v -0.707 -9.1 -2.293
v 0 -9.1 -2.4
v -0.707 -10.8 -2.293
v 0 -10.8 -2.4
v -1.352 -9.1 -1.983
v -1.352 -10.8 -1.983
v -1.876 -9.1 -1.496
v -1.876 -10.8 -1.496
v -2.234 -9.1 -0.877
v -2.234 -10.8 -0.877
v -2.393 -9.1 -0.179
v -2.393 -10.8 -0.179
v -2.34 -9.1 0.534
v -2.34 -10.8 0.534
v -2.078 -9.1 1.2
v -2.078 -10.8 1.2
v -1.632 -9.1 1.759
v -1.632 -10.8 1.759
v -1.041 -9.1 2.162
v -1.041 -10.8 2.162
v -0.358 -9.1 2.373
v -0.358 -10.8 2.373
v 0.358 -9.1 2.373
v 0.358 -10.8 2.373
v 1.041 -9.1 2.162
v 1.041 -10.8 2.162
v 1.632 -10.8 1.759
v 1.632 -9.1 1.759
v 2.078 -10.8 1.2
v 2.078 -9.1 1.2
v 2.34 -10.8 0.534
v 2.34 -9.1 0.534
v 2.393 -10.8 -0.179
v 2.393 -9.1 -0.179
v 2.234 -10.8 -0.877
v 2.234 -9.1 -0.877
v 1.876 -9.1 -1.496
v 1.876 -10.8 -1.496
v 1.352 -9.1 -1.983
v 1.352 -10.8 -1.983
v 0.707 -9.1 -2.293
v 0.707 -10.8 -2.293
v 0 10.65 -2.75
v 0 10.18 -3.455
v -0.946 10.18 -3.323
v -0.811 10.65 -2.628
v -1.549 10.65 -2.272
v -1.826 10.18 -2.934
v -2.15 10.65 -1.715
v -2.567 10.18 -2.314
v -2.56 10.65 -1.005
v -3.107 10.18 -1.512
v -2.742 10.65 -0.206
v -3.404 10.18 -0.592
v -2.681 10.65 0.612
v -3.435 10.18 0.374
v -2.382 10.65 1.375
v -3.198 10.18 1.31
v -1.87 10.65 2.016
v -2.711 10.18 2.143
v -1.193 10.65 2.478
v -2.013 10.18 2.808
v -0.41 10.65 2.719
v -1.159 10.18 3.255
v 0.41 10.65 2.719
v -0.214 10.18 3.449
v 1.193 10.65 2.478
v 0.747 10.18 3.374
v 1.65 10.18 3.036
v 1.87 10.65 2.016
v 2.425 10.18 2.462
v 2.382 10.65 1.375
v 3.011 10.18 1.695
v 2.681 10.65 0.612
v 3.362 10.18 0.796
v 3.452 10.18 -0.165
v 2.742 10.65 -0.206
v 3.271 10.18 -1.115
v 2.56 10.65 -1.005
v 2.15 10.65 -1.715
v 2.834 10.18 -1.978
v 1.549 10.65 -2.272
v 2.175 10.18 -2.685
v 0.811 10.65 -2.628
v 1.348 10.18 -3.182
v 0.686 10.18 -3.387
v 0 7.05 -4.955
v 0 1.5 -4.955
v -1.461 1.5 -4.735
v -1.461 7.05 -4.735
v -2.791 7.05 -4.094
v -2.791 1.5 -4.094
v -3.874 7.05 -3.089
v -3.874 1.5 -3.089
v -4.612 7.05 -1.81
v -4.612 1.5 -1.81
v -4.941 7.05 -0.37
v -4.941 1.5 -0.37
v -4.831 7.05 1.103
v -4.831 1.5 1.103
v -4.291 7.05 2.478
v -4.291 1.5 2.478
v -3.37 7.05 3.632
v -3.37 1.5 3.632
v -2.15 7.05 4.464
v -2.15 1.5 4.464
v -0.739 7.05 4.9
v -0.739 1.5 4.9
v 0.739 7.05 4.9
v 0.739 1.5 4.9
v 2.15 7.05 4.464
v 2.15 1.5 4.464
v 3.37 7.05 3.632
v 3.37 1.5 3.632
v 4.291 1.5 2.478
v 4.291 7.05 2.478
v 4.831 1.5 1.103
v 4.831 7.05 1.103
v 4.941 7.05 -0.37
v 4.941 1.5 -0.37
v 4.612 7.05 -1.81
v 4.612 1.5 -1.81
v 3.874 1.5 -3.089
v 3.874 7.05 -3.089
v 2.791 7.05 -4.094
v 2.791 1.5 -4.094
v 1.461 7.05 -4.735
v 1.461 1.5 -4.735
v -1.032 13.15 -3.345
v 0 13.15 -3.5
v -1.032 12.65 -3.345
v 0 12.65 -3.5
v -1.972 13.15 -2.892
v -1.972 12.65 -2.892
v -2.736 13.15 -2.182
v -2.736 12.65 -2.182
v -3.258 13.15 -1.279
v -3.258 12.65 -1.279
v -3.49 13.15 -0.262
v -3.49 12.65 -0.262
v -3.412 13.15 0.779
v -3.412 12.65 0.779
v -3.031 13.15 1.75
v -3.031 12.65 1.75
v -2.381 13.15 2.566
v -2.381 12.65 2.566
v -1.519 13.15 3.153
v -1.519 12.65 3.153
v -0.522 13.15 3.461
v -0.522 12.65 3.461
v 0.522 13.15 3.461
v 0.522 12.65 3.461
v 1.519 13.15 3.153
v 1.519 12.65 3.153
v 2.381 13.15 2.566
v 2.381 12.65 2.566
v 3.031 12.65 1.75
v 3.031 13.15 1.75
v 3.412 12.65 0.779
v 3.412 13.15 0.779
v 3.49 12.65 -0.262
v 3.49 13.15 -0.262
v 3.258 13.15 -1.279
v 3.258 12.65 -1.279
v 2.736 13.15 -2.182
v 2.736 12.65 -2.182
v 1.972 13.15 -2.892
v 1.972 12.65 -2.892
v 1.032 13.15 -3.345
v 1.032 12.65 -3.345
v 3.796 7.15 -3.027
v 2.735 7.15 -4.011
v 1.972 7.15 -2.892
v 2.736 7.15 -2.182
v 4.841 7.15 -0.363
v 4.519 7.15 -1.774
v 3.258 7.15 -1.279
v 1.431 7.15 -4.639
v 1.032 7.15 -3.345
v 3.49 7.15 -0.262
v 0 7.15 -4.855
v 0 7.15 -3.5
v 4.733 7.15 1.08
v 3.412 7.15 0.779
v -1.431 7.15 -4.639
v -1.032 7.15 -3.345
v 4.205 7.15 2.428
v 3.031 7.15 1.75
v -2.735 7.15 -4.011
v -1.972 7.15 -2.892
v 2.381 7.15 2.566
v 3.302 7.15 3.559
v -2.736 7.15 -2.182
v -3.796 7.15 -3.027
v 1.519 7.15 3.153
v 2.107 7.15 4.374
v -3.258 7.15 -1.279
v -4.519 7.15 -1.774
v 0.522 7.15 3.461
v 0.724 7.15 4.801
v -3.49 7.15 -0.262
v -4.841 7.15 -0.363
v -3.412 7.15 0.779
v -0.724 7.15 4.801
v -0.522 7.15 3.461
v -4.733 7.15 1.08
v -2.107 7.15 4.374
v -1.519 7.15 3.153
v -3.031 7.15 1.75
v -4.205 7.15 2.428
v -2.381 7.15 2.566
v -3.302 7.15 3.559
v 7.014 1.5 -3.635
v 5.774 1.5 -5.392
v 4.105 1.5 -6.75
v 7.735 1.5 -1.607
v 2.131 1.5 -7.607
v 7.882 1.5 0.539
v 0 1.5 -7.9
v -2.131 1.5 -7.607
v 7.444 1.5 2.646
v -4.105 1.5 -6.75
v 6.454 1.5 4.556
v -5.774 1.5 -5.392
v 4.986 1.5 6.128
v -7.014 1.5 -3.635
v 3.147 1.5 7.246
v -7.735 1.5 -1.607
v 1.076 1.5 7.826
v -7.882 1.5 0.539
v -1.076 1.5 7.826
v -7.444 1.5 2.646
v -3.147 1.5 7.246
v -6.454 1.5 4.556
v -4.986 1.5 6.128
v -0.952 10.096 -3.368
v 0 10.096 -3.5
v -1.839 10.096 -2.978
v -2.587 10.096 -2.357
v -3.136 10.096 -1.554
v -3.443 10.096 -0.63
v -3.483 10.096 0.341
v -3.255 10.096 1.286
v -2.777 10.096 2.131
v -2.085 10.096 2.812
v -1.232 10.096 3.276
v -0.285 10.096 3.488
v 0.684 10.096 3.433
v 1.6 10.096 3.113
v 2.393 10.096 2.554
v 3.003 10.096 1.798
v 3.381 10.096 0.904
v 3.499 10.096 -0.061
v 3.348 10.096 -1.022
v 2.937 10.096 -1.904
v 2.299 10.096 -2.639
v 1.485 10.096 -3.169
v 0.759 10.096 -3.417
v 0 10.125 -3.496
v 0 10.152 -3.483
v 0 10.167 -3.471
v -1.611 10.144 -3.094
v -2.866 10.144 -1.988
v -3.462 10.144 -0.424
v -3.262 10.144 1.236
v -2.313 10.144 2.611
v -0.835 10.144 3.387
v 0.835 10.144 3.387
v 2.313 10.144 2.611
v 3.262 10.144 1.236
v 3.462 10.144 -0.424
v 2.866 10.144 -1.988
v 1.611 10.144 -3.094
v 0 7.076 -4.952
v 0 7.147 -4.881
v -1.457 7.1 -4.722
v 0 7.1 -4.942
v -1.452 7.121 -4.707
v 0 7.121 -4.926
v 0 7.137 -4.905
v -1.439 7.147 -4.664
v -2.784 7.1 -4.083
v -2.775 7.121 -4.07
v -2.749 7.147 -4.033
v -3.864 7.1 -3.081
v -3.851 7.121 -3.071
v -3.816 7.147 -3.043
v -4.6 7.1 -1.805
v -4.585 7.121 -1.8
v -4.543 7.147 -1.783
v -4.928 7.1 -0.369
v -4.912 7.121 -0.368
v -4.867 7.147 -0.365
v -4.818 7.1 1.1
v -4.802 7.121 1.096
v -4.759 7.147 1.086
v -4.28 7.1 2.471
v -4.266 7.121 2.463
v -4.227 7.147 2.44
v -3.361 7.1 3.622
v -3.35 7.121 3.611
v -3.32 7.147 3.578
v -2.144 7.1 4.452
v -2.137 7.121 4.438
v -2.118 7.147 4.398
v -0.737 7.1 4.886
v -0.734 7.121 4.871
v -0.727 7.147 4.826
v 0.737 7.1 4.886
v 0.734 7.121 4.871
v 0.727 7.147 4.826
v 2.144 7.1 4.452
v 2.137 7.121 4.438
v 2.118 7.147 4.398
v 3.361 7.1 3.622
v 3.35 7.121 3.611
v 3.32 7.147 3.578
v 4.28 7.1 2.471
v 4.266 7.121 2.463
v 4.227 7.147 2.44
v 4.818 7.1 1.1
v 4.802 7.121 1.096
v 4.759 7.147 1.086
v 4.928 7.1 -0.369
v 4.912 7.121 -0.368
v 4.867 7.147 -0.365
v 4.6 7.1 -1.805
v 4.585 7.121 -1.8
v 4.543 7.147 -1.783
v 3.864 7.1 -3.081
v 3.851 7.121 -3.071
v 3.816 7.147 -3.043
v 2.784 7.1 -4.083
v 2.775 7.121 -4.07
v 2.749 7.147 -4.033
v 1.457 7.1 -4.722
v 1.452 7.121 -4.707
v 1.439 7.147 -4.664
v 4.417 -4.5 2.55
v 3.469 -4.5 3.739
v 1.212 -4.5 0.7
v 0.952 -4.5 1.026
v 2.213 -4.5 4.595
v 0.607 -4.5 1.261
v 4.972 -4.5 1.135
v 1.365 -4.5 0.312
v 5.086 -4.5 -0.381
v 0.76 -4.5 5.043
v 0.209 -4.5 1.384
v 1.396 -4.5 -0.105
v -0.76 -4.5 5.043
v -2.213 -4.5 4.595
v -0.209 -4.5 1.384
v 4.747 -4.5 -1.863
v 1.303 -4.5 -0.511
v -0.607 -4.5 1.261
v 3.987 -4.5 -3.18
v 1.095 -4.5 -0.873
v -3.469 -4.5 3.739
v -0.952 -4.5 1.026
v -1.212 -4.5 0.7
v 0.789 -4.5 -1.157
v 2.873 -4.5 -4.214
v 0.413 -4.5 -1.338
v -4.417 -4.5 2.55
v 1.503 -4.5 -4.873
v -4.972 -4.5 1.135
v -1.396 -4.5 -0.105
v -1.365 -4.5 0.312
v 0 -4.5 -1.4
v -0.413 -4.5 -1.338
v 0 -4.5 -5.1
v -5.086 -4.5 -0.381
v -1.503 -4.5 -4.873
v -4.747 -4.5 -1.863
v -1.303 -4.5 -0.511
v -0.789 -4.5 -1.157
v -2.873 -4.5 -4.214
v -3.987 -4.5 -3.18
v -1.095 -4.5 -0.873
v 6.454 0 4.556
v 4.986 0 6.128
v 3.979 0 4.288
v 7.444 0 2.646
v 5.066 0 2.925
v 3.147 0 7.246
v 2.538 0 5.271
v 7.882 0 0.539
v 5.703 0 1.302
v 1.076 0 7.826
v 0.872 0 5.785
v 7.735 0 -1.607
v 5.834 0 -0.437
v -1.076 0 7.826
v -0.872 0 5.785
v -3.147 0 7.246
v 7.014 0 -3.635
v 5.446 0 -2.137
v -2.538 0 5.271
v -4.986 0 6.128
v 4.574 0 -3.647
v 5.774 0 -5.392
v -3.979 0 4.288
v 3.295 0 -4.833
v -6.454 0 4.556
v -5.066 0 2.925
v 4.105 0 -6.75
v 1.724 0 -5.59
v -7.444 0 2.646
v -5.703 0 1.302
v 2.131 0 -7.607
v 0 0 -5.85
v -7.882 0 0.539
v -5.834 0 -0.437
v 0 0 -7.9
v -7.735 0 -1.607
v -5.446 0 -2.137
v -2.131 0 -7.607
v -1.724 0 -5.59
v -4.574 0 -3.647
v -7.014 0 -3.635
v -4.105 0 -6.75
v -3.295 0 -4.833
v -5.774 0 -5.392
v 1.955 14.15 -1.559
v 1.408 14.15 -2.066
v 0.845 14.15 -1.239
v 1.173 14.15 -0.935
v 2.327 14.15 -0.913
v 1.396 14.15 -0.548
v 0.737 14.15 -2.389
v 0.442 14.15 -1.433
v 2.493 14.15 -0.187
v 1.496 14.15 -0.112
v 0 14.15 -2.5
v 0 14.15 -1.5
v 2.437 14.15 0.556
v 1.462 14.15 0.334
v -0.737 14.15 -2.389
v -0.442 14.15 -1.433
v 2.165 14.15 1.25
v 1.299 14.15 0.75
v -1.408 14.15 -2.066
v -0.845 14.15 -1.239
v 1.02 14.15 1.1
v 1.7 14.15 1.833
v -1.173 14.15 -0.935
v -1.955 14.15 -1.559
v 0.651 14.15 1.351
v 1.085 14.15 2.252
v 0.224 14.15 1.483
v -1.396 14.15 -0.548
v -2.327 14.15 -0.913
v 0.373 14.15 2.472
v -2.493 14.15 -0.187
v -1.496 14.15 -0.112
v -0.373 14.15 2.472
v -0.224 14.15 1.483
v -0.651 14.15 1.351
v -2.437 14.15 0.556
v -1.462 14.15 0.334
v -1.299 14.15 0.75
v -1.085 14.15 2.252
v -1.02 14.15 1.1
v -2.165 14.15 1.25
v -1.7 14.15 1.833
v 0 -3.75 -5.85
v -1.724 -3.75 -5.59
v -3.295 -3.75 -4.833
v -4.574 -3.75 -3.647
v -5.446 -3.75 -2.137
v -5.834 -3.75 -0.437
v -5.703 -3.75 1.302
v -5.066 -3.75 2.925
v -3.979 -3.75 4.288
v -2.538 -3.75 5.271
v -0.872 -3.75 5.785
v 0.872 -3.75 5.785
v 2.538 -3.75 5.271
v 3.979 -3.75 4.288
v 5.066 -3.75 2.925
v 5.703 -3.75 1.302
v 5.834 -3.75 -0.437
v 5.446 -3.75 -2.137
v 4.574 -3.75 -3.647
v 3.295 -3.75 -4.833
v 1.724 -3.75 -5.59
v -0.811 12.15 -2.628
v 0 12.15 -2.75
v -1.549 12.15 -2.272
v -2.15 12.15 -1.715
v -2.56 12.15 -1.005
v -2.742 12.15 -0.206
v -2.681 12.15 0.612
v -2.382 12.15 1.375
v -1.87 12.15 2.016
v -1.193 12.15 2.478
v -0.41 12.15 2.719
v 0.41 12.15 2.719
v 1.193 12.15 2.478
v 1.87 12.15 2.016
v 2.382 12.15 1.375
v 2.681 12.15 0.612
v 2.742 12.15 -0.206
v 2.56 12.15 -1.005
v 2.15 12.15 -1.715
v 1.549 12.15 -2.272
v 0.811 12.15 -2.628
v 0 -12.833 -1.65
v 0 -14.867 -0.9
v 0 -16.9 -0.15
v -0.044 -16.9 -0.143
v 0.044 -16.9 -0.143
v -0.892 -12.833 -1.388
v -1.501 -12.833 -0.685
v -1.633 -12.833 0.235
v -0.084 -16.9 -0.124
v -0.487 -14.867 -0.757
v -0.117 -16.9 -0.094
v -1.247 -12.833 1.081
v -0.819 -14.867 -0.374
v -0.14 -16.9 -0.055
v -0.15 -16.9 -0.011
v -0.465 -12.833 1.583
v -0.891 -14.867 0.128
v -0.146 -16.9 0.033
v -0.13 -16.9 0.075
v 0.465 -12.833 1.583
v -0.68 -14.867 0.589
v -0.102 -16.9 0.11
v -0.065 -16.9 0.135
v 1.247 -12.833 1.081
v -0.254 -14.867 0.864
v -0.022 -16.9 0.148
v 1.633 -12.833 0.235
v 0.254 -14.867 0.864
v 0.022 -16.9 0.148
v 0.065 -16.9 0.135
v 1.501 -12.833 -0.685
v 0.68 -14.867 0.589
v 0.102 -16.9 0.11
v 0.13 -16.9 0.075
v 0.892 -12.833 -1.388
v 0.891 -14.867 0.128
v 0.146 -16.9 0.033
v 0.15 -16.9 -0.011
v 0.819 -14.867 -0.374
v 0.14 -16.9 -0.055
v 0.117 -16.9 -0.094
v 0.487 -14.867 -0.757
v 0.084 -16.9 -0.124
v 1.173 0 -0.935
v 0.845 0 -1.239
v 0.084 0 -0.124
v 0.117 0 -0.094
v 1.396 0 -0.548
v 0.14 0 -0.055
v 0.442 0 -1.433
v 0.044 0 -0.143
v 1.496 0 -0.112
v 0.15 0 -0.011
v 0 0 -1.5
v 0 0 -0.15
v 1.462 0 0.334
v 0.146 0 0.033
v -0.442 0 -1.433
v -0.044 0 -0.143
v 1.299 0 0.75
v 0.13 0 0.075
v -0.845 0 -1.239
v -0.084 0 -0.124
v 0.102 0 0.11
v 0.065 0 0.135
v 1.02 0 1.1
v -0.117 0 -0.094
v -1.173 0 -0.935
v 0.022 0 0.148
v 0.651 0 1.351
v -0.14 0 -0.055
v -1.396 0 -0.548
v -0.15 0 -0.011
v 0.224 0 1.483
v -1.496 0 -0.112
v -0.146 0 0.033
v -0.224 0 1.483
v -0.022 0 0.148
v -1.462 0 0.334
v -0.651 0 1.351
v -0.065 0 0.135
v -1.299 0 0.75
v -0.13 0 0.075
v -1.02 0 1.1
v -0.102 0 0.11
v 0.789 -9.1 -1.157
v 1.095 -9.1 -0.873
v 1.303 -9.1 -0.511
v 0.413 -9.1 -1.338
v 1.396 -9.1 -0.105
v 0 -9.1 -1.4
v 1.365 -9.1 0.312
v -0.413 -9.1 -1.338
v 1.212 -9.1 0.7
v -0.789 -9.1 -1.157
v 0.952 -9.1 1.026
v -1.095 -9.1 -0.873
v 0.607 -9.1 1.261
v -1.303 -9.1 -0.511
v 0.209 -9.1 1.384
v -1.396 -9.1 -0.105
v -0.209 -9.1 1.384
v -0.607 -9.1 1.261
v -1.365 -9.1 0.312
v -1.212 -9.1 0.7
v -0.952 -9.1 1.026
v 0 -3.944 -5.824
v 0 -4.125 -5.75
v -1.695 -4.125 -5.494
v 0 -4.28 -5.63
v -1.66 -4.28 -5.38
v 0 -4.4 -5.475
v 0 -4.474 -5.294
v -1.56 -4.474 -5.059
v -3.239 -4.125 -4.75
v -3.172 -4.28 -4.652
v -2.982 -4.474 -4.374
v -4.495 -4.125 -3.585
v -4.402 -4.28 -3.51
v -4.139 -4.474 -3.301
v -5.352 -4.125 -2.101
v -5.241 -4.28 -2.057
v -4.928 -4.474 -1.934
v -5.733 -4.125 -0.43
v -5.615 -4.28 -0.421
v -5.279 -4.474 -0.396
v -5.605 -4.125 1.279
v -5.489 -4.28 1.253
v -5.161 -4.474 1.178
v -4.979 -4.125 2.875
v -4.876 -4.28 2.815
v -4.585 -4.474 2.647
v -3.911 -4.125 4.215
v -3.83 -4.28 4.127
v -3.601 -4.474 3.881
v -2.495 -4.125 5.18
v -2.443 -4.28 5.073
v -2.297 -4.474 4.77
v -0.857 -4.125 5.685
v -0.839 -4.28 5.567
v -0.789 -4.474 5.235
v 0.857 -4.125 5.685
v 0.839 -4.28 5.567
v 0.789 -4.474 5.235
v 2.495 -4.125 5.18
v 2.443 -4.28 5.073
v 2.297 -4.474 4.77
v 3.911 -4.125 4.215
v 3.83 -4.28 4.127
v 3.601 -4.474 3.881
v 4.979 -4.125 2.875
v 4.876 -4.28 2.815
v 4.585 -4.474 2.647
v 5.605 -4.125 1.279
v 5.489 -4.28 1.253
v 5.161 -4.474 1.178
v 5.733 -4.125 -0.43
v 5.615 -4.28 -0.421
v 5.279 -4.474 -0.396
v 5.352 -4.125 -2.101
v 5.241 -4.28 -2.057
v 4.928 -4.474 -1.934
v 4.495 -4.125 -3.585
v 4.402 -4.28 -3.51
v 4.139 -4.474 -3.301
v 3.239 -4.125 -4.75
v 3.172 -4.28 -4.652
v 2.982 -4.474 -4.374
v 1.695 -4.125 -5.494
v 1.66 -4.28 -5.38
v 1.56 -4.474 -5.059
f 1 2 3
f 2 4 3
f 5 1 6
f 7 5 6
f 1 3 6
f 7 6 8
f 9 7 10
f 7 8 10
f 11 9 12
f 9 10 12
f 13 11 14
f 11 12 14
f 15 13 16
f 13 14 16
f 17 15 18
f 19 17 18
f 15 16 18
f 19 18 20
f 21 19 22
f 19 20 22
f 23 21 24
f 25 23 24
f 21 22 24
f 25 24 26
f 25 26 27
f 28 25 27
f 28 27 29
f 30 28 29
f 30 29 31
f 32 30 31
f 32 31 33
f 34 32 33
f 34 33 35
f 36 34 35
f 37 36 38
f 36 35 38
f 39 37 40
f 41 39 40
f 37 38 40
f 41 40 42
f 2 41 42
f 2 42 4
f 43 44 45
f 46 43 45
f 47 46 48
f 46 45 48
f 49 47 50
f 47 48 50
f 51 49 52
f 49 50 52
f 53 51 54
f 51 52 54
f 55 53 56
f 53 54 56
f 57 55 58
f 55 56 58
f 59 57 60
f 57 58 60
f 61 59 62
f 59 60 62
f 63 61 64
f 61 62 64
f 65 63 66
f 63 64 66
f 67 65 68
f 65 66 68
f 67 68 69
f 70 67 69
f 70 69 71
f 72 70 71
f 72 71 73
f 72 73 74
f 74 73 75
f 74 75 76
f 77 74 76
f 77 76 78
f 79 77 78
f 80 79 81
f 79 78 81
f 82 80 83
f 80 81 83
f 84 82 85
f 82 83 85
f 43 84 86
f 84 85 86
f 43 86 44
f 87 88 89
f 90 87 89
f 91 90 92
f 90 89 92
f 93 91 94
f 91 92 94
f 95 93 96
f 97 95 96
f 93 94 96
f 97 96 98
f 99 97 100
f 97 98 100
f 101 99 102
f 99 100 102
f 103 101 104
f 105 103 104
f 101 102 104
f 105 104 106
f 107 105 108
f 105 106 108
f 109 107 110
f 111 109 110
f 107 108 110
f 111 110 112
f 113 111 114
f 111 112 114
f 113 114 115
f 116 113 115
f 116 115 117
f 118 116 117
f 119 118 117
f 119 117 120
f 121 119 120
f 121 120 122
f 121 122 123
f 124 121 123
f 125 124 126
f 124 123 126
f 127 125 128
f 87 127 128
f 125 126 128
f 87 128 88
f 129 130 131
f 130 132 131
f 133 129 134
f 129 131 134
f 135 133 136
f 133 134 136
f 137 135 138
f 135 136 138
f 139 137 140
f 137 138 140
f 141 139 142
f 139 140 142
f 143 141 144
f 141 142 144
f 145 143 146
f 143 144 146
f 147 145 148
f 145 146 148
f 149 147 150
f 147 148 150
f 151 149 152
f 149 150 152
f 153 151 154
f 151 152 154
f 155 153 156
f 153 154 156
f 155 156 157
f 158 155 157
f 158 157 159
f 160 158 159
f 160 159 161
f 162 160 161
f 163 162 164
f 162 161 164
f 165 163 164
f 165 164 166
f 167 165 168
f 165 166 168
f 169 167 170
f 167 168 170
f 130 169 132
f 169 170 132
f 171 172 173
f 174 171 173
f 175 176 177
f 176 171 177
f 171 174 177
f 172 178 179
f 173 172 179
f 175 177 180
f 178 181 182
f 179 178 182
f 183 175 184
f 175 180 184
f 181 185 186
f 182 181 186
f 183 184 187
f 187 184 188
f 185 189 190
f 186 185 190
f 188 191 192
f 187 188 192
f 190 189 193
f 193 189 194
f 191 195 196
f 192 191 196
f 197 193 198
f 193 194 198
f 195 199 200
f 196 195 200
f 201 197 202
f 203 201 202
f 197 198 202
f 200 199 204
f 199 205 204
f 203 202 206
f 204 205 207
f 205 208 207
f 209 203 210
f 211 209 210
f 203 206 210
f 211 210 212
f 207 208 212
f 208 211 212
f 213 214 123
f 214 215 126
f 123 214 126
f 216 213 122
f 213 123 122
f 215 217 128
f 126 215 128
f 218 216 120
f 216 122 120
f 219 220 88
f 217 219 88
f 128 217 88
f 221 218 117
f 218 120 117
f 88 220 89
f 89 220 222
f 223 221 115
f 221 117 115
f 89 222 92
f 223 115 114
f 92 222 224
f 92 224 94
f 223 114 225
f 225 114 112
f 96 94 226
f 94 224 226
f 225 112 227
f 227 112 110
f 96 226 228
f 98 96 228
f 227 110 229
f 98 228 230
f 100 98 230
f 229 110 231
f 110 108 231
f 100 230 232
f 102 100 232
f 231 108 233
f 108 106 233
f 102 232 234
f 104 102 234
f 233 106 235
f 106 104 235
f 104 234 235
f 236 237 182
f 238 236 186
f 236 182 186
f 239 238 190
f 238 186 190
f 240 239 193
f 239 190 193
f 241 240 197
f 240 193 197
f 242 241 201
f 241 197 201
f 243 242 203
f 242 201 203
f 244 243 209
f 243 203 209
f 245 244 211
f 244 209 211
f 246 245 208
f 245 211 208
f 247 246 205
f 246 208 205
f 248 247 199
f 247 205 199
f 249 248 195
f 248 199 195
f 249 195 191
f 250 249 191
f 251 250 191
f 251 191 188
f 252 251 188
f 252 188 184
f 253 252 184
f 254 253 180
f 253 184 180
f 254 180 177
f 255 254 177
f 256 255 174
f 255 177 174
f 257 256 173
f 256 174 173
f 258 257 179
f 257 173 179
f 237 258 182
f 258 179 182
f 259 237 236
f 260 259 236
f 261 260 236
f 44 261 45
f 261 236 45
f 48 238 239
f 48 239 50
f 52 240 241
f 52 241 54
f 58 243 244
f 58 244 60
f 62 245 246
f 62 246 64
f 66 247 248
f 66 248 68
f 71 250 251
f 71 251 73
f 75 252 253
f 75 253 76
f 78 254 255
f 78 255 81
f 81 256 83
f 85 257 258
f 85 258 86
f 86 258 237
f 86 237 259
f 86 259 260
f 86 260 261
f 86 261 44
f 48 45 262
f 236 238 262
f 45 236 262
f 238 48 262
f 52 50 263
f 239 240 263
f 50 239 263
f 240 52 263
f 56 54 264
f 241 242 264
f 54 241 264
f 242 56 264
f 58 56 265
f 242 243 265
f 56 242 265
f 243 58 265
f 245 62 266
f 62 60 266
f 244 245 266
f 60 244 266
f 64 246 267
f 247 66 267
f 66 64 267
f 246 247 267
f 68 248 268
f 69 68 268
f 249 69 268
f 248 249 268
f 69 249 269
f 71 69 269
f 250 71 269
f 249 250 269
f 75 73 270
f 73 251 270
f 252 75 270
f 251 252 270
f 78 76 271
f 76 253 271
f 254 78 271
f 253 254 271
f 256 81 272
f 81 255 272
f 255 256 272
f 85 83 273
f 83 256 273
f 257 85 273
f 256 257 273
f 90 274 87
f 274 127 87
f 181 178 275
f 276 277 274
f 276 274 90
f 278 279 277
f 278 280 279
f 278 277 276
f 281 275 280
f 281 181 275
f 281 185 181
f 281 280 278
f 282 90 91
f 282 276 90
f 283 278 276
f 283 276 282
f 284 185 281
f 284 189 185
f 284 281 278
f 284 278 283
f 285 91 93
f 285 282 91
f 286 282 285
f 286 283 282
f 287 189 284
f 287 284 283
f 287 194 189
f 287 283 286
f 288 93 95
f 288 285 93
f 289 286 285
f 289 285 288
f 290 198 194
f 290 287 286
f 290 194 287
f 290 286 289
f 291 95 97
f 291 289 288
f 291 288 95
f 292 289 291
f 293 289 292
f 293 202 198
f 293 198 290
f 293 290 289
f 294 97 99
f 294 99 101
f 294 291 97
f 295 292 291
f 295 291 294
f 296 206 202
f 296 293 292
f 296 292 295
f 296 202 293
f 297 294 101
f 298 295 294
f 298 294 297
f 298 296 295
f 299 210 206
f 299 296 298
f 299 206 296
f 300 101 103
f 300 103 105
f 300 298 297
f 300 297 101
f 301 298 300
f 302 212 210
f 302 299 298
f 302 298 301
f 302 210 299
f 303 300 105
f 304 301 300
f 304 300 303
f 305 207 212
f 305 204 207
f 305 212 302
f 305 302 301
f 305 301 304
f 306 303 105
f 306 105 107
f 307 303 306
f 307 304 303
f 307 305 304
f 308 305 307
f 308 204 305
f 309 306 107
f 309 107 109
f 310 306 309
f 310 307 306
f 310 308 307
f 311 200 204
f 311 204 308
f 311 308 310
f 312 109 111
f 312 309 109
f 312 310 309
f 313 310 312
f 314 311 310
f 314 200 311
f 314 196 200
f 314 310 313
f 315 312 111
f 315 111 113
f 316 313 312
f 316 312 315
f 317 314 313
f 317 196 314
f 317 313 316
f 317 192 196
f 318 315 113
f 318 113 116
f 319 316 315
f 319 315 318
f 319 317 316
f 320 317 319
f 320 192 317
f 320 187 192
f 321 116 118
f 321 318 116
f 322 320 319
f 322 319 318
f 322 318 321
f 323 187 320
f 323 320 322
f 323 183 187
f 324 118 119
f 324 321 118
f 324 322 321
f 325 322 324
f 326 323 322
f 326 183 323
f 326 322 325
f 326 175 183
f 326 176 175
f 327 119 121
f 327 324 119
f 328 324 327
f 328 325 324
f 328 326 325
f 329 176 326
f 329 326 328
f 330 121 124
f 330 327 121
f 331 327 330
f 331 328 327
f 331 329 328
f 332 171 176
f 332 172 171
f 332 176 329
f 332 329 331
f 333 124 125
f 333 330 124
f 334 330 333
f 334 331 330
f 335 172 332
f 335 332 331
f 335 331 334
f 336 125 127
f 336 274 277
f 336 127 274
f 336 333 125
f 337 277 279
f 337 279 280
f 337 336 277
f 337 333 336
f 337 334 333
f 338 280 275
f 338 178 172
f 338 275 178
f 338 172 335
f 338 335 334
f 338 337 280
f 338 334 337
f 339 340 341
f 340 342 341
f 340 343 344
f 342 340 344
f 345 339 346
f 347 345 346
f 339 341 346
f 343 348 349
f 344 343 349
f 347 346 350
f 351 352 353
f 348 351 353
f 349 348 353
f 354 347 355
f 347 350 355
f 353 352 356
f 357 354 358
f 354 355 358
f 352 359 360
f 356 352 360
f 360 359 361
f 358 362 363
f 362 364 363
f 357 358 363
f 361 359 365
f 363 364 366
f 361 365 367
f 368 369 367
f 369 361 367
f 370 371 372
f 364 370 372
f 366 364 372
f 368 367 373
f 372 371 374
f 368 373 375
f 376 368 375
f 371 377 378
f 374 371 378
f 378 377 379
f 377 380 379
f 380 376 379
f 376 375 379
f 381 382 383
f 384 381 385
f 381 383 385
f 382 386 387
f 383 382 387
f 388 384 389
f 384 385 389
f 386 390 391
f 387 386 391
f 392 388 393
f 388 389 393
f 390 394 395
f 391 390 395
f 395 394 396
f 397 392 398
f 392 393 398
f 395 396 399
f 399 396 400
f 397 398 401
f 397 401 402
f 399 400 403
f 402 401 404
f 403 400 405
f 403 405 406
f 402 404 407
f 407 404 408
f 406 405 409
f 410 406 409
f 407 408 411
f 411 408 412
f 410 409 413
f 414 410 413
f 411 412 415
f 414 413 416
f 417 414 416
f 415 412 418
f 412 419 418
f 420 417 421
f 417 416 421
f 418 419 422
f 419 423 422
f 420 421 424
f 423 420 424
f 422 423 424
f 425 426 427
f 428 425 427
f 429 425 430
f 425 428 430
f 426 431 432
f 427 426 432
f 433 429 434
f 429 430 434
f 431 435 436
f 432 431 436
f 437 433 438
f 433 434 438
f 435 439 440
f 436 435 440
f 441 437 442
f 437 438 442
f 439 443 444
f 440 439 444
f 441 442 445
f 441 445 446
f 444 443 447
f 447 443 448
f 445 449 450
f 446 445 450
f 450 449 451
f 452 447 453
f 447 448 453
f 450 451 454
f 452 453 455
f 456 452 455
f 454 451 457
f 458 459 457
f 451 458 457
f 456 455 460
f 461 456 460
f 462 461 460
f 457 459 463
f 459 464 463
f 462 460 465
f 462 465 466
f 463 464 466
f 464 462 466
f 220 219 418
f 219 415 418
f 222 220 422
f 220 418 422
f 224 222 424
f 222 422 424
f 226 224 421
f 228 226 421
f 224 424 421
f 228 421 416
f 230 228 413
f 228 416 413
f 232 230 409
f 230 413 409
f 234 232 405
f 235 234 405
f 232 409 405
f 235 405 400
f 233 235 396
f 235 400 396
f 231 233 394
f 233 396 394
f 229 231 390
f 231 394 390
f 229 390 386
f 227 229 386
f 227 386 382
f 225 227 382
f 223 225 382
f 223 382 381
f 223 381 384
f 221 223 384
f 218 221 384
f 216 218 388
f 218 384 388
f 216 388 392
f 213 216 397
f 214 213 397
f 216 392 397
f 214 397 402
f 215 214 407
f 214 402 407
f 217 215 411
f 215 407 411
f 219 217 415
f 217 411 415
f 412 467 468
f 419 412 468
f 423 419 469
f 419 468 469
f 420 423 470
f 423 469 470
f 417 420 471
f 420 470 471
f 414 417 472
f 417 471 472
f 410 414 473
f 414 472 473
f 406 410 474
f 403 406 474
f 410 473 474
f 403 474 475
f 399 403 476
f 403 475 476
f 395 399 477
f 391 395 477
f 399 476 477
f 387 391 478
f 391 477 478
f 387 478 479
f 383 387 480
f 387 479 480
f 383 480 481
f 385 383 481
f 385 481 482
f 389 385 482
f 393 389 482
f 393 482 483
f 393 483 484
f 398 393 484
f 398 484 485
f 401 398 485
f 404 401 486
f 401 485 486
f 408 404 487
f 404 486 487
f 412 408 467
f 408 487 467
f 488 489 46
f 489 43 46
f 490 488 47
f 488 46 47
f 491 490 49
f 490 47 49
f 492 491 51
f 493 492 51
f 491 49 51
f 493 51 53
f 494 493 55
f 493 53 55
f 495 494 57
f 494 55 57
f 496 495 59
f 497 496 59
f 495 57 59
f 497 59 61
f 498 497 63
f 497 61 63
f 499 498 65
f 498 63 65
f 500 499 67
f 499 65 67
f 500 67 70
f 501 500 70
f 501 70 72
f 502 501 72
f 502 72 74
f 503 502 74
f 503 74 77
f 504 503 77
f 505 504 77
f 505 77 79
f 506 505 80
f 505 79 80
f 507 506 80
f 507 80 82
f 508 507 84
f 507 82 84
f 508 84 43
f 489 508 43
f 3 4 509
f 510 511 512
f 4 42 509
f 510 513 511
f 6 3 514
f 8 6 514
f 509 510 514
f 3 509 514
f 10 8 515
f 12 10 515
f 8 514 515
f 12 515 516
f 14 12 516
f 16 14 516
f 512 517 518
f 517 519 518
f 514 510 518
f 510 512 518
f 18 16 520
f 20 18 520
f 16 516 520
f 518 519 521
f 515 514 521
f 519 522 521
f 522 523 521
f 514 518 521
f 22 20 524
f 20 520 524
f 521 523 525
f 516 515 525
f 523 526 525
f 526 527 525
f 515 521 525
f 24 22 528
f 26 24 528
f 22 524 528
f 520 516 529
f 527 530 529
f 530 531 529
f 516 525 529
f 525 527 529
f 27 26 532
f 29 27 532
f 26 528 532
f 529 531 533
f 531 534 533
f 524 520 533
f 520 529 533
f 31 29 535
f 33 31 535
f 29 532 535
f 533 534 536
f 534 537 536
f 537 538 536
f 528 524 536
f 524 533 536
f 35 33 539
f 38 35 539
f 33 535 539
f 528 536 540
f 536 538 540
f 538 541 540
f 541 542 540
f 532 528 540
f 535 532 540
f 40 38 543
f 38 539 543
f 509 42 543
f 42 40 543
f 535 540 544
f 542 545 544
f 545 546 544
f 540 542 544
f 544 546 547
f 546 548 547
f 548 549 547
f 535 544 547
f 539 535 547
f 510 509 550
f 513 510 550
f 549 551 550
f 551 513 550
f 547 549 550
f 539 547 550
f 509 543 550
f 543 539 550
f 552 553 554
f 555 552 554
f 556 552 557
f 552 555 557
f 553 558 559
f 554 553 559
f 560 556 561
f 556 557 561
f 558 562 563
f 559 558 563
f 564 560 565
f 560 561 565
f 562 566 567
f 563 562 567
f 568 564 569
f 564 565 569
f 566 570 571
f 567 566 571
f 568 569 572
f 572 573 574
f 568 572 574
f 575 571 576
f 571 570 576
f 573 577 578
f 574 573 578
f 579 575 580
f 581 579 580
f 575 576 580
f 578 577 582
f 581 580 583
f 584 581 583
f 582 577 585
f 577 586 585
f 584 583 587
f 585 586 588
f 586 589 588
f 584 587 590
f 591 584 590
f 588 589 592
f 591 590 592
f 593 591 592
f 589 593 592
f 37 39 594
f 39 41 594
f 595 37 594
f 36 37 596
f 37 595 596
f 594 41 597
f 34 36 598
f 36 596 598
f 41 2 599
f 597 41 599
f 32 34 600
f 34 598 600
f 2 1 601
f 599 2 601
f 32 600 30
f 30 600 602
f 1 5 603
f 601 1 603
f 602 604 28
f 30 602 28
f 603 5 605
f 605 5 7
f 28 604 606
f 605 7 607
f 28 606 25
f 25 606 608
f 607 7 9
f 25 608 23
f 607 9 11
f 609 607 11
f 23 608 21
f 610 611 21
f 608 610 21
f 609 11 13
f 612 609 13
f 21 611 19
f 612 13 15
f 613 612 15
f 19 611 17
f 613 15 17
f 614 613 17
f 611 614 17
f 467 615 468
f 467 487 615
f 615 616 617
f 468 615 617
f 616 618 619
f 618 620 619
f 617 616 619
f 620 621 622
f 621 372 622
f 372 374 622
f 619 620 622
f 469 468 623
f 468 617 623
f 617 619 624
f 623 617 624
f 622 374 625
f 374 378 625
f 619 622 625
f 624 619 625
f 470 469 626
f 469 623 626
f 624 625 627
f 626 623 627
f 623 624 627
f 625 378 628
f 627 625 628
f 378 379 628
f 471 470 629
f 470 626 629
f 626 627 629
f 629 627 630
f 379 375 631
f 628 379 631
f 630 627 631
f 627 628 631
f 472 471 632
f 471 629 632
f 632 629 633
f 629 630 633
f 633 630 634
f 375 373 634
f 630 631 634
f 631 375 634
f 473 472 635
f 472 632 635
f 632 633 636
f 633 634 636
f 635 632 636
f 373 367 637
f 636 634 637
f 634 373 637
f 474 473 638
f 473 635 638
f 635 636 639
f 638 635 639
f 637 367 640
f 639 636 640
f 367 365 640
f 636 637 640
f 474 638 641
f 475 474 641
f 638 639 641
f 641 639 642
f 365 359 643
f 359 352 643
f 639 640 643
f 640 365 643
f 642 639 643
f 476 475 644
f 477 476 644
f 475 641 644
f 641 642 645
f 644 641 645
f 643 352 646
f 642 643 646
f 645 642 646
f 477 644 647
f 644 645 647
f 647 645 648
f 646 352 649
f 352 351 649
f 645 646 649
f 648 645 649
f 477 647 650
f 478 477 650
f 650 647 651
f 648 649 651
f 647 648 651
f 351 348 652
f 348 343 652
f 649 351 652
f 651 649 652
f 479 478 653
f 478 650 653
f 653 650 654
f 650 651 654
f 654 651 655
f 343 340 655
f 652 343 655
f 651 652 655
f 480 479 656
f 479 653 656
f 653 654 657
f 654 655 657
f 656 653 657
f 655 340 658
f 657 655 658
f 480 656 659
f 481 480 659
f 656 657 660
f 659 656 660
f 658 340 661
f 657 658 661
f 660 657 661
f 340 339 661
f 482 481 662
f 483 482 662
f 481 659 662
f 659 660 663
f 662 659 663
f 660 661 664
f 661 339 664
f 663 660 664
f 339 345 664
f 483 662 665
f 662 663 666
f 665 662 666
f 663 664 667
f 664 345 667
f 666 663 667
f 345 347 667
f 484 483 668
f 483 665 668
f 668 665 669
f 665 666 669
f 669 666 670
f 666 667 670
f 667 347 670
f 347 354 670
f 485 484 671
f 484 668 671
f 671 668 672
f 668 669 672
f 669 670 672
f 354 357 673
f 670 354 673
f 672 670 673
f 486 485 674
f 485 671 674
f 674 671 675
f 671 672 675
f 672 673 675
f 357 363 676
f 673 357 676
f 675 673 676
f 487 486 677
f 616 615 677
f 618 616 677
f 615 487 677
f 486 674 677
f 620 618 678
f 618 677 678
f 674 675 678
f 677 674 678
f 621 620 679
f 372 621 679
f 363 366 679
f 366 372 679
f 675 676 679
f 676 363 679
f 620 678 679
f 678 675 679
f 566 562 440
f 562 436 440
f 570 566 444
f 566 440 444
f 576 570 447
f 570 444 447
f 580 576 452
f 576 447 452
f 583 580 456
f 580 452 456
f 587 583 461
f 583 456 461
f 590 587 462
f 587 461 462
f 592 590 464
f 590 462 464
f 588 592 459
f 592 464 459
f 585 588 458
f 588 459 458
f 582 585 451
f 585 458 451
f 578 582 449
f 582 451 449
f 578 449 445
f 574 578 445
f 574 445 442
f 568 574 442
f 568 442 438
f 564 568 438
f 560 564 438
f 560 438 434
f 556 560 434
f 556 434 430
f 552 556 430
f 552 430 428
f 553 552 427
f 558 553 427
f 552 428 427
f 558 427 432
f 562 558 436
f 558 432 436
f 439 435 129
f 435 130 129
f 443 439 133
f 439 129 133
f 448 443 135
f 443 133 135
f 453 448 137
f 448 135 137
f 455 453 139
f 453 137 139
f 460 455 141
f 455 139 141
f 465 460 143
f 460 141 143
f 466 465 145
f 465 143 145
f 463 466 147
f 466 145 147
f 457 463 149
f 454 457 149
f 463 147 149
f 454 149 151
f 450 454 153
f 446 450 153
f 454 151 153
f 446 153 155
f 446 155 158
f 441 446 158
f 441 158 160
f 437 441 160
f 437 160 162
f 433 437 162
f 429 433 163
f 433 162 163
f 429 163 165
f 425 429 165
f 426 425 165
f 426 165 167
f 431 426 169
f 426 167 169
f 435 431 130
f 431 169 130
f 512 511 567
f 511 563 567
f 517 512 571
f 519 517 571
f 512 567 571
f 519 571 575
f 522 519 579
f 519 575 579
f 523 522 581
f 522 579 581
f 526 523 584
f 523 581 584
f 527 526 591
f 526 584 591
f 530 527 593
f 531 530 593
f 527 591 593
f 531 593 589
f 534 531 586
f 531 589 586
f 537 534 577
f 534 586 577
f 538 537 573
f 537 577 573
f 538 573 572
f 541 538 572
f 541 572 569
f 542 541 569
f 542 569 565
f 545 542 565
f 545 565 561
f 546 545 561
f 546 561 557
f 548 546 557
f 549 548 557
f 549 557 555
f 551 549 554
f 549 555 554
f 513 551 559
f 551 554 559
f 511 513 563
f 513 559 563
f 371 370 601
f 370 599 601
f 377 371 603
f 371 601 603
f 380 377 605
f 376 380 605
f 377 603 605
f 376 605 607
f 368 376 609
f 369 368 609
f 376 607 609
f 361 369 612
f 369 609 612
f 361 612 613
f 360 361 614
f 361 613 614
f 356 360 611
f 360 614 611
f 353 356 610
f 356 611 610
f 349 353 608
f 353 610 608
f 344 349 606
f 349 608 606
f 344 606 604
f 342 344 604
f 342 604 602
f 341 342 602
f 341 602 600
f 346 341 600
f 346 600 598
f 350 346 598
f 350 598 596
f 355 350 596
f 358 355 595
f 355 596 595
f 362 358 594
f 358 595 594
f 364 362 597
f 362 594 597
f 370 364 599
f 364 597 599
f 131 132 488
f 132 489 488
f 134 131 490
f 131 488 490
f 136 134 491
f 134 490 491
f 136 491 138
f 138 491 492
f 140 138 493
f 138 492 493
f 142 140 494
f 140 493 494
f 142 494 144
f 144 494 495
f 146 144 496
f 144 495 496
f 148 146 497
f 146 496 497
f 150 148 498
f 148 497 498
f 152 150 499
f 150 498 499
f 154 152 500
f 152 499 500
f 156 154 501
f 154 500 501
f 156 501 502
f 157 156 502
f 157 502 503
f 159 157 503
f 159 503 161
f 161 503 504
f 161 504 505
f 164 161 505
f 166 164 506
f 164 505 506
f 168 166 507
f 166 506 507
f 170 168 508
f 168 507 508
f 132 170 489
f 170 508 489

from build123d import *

# Parameters (mm, degrees)
FILLET1_R = 0.75
FILLET2_R = 0.1


with BuildPart() as part:
    # Sketch1 → Revolve1 (revolve)
    with BuildSketch(Plane.XY, mode=Mode.PRIVATE) as revolve1_sk:
        Polygon((1.5, 14.15), (2.5, 14.15), (3.5, 13.15), (3.5, 12.65), (2.75, 12.15), (2.75, 10.65), (3.5, 10.15), (3.5, 7.15), (4.955, 7.15), (4.955, 1.5), (7.9, 1.5), (7.9, 0), (5.85, 0), (5.85, -4.5), (1.4, -4.5), (1.4, -9.1), (2.4, -9.1), (2.4, -10.8), (0.15, -16.9), (0.15, 0), (1.5, 0), align=None)
    revolve(revolve1_sk.sketch.rotate(Axis((0, 0, 0), (0, 1, 0)), 90), axis=Axis((0, 0, 0), (0, 1, 0)))

    # Fillet1
    fillet1_edges = [part.edges().sort_by_distance(p)[0] for p in [
        (0, -4.5, 5.85),
    ]]
    fillet(fillet1_edges, radius=FILLET1_R)

    # Fillet2
    fillet2_edges = [part.edges().sort_by_distance(p)[0] for p in [
        (0, 7.15, 4.955),
        (0, 10.15, 3.5),
    ]]
    fillet(fillet2_edges, radius=FILLET2_R)


solid = part.part
